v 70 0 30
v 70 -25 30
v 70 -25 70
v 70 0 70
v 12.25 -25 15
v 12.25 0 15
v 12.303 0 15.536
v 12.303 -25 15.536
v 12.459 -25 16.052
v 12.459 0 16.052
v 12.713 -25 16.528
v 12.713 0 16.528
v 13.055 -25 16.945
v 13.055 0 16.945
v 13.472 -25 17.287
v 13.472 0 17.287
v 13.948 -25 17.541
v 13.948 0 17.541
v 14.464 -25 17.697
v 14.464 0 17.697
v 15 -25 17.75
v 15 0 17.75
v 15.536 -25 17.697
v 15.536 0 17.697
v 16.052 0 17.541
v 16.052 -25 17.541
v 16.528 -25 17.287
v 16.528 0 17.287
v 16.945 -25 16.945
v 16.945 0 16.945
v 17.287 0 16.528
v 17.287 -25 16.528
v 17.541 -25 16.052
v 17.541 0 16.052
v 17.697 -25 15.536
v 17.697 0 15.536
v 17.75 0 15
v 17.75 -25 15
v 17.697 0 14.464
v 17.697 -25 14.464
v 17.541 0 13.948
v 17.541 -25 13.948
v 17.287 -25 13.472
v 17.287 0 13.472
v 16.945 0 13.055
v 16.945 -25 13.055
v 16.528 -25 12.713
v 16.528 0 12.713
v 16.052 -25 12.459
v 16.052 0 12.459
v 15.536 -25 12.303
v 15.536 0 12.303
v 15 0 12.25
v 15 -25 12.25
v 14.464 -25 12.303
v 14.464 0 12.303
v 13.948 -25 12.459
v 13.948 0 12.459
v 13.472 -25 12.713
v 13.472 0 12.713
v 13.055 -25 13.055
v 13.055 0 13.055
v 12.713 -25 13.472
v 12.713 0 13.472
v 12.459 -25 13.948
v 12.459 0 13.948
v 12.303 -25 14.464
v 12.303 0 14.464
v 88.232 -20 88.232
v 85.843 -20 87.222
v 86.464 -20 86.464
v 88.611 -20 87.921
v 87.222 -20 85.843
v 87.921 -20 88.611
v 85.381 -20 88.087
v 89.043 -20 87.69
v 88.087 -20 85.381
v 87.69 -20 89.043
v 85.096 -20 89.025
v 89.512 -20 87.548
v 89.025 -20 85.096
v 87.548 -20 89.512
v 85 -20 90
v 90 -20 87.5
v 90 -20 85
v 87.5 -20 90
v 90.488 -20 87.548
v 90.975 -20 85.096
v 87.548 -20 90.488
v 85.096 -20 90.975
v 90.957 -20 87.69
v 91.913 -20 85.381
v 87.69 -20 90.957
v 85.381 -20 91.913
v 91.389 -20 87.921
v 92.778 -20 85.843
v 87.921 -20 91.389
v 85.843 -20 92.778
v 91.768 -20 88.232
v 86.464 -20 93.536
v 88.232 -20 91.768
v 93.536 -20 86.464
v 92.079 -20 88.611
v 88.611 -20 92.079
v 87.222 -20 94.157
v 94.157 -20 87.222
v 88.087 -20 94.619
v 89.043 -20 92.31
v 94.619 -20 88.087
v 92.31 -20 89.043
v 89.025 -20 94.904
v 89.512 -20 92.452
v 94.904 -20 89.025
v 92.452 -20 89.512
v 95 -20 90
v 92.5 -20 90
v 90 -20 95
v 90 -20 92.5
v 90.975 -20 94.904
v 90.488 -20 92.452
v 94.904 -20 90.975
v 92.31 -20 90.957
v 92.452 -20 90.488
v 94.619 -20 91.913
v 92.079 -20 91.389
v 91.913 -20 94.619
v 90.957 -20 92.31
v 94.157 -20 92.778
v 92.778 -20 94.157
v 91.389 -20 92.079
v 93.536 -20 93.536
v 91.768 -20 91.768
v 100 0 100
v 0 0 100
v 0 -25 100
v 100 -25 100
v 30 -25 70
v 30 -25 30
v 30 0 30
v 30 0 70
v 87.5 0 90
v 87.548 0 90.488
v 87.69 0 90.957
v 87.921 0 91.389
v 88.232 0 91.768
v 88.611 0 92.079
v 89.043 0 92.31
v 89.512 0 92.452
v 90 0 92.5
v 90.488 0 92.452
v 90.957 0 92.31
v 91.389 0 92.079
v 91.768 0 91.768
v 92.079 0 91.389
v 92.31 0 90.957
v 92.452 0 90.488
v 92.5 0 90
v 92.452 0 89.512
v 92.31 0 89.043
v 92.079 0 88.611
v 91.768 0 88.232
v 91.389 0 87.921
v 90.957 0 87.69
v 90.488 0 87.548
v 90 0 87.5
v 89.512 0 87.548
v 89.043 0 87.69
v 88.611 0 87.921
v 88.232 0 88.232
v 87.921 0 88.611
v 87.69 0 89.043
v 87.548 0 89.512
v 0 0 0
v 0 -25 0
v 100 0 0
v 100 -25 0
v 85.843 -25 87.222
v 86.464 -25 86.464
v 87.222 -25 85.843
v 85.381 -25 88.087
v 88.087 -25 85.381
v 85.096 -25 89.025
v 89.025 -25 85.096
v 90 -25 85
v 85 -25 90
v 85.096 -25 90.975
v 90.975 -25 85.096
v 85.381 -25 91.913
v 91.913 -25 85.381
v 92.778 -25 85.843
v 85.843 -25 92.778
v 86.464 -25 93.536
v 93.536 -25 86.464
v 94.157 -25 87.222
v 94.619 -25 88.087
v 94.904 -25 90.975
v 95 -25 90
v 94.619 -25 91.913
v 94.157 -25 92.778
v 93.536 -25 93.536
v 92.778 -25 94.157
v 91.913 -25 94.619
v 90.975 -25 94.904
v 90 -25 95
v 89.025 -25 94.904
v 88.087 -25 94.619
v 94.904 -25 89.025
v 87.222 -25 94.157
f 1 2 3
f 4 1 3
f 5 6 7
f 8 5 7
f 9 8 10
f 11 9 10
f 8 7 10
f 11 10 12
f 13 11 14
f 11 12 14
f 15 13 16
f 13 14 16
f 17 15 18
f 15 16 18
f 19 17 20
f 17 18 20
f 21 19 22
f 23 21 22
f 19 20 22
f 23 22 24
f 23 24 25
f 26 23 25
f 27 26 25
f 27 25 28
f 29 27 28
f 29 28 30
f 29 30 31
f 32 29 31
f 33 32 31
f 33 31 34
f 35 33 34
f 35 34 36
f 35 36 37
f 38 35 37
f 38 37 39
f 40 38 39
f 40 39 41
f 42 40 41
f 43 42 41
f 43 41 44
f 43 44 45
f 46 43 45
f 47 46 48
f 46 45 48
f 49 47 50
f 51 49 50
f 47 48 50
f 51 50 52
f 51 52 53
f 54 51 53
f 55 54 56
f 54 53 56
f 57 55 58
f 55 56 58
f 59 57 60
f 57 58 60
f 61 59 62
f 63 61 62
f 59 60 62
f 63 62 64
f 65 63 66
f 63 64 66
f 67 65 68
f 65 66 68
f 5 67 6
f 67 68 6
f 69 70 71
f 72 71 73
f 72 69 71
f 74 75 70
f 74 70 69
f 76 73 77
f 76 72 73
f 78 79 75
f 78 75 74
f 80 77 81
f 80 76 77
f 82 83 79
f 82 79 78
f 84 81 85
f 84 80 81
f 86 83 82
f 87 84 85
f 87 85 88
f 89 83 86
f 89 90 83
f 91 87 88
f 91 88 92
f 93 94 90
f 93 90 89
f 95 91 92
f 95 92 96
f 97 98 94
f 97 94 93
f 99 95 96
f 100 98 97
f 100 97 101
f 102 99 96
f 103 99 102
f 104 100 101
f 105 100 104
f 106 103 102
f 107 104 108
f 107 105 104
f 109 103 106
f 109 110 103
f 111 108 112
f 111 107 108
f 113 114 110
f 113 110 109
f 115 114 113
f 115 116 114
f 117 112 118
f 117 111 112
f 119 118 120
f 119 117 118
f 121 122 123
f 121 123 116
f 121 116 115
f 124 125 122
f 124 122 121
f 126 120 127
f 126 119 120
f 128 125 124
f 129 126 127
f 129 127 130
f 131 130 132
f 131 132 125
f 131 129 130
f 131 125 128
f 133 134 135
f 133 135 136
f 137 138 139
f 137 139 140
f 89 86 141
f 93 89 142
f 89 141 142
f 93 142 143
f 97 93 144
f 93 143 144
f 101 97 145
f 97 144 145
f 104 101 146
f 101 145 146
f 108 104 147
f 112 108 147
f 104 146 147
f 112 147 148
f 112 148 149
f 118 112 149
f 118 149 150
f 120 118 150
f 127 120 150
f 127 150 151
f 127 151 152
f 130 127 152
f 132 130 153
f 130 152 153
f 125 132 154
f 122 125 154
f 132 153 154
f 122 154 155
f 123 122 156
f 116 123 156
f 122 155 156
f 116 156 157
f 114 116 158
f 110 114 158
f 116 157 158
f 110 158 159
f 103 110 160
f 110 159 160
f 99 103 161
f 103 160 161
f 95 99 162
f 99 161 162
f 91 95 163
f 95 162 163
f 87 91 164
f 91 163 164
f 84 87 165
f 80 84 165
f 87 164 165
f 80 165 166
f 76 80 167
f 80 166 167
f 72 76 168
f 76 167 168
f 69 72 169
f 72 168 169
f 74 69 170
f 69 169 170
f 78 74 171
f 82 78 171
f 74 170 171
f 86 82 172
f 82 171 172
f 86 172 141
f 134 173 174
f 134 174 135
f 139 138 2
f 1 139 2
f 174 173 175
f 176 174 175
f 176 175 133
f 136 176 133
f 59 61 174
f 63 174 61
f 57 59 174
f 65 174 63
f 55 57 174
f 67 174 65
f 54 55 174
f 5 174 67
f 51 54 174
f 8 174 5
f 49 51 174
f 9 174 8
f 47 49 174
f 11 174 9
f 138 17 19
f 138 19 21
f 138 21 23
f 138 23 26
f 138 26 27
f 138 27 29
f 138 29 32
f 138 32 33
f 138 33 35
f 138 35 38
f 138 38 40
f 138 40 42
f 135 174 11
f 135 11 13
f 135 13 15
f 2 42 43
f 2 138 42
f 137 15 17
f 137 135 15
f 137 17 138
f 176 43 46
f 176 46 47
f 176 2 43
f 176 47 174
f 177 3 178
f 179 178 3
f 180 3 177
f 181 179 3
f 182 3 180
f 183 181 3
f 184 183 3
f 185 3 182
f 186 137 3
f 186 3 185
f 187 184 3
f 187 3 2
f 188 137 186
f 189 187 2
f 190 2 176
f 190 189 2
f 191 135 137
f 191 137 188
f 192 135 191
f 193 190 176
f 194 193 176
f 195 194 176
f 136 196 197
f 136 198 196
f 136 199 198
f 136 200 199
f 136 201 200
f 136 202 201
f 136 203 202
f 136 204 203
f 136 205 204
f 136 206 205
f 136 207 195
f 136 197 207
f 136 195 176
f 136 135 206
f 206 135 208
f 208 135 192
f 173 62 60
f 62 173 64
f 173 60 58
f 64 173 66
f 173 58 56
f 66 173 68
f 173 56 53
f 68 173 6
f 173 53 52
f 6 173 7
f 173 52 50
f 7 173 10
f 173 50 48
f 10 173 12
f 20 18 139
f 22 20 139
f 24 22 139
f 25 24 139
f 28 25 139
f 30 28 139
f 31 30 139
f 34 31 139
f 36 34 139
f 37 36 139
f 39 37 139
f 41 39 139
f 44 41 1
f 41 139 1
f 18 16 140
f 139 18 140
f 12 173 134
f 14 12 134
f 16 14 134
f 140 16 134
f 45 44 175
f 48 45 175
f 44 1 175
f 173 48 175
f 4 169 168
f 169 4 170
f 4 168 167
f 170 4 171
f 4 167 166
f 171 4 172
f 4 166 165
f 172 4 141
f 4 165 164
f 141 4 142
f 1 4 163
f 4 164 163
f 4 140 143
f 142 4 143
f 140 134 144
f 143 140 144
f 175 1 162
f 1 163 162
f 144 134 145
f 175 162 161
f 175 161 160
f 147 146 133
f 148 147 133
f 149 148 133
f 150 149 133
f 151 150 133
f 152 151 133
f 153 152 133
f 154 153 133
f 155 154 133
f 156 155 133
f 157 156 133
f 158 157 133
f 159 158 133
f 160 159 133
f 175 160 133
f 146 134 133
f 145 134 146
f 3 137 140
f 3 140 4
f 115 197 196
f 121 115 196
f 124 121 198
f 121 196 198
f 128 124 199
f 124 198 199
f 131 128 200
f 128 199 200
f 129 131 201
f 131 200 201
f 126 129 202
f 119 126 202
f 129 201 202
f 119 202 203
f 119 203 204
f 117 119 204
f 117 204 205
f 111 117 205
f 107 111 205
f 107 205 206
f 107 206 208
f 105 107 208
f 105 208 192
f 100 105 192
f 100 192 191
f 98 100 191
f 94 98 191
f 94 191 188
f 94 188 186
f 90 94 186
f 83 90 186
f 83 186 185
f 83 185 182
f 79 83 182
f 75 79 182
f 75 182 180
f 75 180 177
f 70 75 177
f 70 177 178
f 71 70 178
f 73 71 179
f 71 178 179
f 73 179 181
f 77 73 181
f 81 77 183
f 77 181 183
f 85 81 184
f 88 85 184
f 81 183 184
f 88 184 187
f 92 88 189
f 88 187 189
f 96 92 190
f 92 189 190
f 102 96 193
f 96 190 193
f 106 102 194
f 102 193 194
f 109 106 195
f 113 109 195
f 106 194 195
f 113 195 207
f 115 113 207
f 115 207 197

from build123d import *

# Parameters (mm, degrees)
F0_W           = 100
F0_H           = 100
F1_DEPTH       = 25
F2_W           = 40
F2_H           = 40
F3_DEPTH       = 25
F5_D           = 5
F5_CBORE_D     = 10
F5_CBORE_DEPTH = 5
F7_D           = 5.5


with BuildPart() as f1:
    # F0 (on Front) → F1 (new body)
    with BuildSketch(Plane.XZ):
        with Locations((50, 50)):
            Rectangle(F0_W, F0_H)
    extrude(amount=F1_DEPTH)

    # F2 (on face) → F3 (cut)
    with BuildSketch(Plane.XZ.offset(25)):
        with Locations((50, 50)):
            Rectangle(F2_W, F2_H)
    extrude(amount=-F3_DEPTH, mode=Mode.SUBTRACT)

    # F5 (through all)
    with Locations(Plane.XZ.offset(25)):
        with Locations((90, 90)):
            CounterBoreHole(F5_D / 2, F5_CBORE_D / 2, F5_CBORE_DEPTH)

    # F7 (through all)
    with Locations(Plane.XZ.offset(25)):
        with Locations((15, 15)):
            Hole(F7_D / 2)


solid = f1.part
